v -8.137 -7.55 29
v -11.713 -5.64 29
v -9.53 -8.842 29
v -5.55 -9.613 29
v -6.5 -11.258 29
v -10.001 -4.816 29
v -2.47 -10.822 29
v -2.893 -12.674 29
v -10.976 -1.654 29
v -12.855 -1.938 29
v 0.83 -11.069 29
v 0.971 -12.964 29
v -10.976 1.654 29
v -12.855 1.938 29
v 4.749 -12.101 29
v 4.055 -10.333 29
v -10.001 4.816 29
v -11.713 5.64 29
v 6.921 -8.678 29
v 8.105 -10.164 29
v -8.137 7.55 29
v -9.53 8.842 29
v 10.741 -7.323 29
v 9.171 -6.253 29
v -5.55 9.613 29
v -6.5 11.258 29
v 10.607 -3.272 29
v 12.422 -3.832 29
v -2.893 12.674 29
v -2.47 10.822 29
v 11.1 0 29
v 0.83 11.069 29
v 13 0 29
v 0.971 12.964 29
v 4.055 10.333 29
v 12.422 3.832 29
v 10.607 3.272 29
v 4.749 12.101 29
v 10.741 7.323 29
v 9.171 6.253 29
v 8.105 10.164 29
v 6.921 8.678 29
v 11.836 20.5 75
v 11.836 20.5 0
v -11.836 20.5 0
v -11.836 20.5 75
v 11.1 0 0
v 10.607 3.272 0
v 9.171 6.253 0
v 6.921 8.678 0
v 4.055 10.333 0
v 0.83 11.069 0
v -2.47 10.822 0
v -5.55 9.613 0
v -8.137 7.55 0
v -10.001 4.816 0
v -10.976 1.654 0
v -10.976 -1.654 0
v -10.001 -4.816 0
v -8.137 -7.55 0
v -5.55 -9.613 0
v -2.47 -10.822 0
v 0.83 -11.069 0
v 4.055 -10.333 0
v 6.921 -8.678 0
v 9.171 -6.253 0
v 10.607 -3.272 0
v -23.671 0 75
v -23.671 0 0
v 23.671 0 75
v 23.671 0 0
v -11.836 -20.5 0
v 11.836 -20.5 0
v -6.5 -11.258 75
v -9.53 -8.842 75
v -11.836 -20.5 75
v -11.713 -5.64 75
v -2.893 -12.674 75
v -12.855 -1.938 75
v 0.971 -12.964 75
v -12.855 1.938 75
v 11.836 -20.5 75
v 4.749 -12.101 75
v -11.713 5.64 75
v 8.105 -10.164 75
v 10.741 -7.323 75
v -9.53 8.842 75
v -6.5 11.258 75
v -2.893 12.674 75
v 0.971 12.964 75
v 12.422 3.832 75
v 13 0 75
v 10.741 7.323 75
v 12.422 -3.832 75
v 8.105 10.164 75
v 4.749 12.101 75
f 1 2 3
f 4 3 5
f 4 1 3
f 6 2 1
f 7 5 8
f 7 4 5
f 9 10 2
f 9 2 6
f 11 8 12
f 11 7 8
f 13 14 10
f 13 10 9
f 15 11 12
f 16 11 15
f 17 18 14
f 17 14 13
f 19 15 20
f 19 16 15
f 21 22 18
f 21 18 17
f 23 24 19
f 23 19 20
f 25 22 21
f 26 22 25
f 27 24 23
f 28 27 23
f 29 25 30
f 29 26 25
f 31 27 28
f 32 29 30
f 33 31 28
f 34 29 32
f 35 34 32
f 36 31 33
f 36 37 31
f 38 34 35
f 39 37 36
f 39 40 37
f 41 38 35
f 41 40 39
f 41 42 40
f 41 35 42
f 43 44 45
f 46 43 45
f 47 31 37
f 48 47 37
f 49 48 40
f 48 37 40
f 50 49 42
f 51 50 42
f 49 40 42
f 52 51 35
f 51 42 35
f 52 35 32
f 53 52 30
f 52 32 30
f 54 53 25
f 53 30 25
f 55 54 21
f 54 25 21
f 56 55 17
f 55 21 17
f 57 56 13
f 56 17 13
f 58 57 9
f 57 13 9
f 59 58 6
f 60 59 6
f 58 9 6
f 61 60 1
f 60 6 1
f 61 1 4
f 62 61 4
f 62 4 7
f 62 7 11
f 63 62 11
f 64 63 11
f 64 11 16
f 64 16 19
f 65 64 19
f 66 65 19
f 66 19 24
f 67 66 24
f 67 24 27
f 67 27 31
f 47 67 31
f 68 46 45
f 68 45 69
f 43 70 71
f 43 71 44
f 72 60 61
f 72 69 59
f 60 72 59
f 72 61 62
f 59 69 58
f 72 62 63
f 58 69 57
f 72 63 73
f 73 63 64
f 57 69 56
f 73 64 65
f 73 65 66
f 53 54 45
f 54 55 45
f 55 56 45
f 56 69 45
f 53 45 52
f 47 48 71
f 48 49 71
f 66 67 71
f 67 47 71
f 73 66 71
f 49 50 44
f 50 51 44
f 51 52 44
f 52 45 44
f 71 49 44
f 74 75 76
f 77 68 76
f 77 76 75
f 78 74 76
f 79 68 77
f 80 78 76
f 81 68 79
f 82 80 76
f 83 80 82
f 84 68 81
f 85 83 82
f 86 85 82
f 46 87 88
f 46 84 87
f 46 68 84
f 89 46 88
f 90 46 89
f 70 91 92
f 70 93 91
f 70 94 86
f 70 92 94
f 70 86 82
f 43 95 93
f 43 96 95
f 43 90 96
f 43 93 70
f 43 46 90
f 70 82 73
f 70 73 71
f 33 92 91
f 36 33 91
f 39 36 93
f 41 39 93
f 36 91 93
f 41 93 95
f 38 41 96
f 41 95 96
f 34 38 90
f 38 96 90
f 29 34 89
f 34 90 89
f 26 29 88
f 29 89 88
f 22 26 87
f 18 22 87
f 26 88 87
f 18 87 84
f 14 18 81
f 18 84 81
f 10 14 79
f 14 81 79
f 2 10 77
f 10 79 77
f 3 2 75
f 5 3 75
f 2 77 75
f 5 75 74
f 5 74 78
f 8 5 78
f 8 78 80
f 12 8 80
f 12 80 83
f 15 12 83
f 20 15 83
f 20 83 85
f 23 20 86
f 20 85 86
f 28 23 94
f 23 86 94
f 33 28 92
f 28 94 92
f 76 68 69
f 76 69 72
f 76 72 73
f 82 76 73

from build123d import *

# Parameters (mm, degrees)
EXTRUDE_1_DEPTH     = 75
SKETCH_2_R          = 13
CUT_EXTRUDE_1_DEPTH = 46
SKETCH_3_R          = 11.1
CUT_EXTRUDE_2_DEPTH = 63


with BuildPart() as part:
    # 草图1 → 凸台-拉伸1 (new body)
    with BuildSketch(Plane.XY):
        Polygon((-23.671361037, 0), (-11.835680518, -20.5), (11.835680518, -20.5), (23.671361037, 0), (11.835680518, 20.5), (-11.835680518, 20.5), align=None)
    extrude(amount=EXTRUDE_1_DEPTH)

    # 草图2 → 切除-拉伸1 (cut)
    with BuildSketch(Plane.XY.offset(75)):
        Circle(SKETCH_2_R)
    extrude(amount=-CUT_EXTRUDE_1_DEPTH, mode=Mode.SUBTRACT)

    # 草图3 → 切除-拉伸2 (cut)
    with BuildSketch(Plane.XY.offset(29)):
        Circle(SKETCH_3_R)
    extrude(amount=-CUT_EXTRUDE_2_DEPTH, mode=Mode.SUBTRACT)


solid = part.part
